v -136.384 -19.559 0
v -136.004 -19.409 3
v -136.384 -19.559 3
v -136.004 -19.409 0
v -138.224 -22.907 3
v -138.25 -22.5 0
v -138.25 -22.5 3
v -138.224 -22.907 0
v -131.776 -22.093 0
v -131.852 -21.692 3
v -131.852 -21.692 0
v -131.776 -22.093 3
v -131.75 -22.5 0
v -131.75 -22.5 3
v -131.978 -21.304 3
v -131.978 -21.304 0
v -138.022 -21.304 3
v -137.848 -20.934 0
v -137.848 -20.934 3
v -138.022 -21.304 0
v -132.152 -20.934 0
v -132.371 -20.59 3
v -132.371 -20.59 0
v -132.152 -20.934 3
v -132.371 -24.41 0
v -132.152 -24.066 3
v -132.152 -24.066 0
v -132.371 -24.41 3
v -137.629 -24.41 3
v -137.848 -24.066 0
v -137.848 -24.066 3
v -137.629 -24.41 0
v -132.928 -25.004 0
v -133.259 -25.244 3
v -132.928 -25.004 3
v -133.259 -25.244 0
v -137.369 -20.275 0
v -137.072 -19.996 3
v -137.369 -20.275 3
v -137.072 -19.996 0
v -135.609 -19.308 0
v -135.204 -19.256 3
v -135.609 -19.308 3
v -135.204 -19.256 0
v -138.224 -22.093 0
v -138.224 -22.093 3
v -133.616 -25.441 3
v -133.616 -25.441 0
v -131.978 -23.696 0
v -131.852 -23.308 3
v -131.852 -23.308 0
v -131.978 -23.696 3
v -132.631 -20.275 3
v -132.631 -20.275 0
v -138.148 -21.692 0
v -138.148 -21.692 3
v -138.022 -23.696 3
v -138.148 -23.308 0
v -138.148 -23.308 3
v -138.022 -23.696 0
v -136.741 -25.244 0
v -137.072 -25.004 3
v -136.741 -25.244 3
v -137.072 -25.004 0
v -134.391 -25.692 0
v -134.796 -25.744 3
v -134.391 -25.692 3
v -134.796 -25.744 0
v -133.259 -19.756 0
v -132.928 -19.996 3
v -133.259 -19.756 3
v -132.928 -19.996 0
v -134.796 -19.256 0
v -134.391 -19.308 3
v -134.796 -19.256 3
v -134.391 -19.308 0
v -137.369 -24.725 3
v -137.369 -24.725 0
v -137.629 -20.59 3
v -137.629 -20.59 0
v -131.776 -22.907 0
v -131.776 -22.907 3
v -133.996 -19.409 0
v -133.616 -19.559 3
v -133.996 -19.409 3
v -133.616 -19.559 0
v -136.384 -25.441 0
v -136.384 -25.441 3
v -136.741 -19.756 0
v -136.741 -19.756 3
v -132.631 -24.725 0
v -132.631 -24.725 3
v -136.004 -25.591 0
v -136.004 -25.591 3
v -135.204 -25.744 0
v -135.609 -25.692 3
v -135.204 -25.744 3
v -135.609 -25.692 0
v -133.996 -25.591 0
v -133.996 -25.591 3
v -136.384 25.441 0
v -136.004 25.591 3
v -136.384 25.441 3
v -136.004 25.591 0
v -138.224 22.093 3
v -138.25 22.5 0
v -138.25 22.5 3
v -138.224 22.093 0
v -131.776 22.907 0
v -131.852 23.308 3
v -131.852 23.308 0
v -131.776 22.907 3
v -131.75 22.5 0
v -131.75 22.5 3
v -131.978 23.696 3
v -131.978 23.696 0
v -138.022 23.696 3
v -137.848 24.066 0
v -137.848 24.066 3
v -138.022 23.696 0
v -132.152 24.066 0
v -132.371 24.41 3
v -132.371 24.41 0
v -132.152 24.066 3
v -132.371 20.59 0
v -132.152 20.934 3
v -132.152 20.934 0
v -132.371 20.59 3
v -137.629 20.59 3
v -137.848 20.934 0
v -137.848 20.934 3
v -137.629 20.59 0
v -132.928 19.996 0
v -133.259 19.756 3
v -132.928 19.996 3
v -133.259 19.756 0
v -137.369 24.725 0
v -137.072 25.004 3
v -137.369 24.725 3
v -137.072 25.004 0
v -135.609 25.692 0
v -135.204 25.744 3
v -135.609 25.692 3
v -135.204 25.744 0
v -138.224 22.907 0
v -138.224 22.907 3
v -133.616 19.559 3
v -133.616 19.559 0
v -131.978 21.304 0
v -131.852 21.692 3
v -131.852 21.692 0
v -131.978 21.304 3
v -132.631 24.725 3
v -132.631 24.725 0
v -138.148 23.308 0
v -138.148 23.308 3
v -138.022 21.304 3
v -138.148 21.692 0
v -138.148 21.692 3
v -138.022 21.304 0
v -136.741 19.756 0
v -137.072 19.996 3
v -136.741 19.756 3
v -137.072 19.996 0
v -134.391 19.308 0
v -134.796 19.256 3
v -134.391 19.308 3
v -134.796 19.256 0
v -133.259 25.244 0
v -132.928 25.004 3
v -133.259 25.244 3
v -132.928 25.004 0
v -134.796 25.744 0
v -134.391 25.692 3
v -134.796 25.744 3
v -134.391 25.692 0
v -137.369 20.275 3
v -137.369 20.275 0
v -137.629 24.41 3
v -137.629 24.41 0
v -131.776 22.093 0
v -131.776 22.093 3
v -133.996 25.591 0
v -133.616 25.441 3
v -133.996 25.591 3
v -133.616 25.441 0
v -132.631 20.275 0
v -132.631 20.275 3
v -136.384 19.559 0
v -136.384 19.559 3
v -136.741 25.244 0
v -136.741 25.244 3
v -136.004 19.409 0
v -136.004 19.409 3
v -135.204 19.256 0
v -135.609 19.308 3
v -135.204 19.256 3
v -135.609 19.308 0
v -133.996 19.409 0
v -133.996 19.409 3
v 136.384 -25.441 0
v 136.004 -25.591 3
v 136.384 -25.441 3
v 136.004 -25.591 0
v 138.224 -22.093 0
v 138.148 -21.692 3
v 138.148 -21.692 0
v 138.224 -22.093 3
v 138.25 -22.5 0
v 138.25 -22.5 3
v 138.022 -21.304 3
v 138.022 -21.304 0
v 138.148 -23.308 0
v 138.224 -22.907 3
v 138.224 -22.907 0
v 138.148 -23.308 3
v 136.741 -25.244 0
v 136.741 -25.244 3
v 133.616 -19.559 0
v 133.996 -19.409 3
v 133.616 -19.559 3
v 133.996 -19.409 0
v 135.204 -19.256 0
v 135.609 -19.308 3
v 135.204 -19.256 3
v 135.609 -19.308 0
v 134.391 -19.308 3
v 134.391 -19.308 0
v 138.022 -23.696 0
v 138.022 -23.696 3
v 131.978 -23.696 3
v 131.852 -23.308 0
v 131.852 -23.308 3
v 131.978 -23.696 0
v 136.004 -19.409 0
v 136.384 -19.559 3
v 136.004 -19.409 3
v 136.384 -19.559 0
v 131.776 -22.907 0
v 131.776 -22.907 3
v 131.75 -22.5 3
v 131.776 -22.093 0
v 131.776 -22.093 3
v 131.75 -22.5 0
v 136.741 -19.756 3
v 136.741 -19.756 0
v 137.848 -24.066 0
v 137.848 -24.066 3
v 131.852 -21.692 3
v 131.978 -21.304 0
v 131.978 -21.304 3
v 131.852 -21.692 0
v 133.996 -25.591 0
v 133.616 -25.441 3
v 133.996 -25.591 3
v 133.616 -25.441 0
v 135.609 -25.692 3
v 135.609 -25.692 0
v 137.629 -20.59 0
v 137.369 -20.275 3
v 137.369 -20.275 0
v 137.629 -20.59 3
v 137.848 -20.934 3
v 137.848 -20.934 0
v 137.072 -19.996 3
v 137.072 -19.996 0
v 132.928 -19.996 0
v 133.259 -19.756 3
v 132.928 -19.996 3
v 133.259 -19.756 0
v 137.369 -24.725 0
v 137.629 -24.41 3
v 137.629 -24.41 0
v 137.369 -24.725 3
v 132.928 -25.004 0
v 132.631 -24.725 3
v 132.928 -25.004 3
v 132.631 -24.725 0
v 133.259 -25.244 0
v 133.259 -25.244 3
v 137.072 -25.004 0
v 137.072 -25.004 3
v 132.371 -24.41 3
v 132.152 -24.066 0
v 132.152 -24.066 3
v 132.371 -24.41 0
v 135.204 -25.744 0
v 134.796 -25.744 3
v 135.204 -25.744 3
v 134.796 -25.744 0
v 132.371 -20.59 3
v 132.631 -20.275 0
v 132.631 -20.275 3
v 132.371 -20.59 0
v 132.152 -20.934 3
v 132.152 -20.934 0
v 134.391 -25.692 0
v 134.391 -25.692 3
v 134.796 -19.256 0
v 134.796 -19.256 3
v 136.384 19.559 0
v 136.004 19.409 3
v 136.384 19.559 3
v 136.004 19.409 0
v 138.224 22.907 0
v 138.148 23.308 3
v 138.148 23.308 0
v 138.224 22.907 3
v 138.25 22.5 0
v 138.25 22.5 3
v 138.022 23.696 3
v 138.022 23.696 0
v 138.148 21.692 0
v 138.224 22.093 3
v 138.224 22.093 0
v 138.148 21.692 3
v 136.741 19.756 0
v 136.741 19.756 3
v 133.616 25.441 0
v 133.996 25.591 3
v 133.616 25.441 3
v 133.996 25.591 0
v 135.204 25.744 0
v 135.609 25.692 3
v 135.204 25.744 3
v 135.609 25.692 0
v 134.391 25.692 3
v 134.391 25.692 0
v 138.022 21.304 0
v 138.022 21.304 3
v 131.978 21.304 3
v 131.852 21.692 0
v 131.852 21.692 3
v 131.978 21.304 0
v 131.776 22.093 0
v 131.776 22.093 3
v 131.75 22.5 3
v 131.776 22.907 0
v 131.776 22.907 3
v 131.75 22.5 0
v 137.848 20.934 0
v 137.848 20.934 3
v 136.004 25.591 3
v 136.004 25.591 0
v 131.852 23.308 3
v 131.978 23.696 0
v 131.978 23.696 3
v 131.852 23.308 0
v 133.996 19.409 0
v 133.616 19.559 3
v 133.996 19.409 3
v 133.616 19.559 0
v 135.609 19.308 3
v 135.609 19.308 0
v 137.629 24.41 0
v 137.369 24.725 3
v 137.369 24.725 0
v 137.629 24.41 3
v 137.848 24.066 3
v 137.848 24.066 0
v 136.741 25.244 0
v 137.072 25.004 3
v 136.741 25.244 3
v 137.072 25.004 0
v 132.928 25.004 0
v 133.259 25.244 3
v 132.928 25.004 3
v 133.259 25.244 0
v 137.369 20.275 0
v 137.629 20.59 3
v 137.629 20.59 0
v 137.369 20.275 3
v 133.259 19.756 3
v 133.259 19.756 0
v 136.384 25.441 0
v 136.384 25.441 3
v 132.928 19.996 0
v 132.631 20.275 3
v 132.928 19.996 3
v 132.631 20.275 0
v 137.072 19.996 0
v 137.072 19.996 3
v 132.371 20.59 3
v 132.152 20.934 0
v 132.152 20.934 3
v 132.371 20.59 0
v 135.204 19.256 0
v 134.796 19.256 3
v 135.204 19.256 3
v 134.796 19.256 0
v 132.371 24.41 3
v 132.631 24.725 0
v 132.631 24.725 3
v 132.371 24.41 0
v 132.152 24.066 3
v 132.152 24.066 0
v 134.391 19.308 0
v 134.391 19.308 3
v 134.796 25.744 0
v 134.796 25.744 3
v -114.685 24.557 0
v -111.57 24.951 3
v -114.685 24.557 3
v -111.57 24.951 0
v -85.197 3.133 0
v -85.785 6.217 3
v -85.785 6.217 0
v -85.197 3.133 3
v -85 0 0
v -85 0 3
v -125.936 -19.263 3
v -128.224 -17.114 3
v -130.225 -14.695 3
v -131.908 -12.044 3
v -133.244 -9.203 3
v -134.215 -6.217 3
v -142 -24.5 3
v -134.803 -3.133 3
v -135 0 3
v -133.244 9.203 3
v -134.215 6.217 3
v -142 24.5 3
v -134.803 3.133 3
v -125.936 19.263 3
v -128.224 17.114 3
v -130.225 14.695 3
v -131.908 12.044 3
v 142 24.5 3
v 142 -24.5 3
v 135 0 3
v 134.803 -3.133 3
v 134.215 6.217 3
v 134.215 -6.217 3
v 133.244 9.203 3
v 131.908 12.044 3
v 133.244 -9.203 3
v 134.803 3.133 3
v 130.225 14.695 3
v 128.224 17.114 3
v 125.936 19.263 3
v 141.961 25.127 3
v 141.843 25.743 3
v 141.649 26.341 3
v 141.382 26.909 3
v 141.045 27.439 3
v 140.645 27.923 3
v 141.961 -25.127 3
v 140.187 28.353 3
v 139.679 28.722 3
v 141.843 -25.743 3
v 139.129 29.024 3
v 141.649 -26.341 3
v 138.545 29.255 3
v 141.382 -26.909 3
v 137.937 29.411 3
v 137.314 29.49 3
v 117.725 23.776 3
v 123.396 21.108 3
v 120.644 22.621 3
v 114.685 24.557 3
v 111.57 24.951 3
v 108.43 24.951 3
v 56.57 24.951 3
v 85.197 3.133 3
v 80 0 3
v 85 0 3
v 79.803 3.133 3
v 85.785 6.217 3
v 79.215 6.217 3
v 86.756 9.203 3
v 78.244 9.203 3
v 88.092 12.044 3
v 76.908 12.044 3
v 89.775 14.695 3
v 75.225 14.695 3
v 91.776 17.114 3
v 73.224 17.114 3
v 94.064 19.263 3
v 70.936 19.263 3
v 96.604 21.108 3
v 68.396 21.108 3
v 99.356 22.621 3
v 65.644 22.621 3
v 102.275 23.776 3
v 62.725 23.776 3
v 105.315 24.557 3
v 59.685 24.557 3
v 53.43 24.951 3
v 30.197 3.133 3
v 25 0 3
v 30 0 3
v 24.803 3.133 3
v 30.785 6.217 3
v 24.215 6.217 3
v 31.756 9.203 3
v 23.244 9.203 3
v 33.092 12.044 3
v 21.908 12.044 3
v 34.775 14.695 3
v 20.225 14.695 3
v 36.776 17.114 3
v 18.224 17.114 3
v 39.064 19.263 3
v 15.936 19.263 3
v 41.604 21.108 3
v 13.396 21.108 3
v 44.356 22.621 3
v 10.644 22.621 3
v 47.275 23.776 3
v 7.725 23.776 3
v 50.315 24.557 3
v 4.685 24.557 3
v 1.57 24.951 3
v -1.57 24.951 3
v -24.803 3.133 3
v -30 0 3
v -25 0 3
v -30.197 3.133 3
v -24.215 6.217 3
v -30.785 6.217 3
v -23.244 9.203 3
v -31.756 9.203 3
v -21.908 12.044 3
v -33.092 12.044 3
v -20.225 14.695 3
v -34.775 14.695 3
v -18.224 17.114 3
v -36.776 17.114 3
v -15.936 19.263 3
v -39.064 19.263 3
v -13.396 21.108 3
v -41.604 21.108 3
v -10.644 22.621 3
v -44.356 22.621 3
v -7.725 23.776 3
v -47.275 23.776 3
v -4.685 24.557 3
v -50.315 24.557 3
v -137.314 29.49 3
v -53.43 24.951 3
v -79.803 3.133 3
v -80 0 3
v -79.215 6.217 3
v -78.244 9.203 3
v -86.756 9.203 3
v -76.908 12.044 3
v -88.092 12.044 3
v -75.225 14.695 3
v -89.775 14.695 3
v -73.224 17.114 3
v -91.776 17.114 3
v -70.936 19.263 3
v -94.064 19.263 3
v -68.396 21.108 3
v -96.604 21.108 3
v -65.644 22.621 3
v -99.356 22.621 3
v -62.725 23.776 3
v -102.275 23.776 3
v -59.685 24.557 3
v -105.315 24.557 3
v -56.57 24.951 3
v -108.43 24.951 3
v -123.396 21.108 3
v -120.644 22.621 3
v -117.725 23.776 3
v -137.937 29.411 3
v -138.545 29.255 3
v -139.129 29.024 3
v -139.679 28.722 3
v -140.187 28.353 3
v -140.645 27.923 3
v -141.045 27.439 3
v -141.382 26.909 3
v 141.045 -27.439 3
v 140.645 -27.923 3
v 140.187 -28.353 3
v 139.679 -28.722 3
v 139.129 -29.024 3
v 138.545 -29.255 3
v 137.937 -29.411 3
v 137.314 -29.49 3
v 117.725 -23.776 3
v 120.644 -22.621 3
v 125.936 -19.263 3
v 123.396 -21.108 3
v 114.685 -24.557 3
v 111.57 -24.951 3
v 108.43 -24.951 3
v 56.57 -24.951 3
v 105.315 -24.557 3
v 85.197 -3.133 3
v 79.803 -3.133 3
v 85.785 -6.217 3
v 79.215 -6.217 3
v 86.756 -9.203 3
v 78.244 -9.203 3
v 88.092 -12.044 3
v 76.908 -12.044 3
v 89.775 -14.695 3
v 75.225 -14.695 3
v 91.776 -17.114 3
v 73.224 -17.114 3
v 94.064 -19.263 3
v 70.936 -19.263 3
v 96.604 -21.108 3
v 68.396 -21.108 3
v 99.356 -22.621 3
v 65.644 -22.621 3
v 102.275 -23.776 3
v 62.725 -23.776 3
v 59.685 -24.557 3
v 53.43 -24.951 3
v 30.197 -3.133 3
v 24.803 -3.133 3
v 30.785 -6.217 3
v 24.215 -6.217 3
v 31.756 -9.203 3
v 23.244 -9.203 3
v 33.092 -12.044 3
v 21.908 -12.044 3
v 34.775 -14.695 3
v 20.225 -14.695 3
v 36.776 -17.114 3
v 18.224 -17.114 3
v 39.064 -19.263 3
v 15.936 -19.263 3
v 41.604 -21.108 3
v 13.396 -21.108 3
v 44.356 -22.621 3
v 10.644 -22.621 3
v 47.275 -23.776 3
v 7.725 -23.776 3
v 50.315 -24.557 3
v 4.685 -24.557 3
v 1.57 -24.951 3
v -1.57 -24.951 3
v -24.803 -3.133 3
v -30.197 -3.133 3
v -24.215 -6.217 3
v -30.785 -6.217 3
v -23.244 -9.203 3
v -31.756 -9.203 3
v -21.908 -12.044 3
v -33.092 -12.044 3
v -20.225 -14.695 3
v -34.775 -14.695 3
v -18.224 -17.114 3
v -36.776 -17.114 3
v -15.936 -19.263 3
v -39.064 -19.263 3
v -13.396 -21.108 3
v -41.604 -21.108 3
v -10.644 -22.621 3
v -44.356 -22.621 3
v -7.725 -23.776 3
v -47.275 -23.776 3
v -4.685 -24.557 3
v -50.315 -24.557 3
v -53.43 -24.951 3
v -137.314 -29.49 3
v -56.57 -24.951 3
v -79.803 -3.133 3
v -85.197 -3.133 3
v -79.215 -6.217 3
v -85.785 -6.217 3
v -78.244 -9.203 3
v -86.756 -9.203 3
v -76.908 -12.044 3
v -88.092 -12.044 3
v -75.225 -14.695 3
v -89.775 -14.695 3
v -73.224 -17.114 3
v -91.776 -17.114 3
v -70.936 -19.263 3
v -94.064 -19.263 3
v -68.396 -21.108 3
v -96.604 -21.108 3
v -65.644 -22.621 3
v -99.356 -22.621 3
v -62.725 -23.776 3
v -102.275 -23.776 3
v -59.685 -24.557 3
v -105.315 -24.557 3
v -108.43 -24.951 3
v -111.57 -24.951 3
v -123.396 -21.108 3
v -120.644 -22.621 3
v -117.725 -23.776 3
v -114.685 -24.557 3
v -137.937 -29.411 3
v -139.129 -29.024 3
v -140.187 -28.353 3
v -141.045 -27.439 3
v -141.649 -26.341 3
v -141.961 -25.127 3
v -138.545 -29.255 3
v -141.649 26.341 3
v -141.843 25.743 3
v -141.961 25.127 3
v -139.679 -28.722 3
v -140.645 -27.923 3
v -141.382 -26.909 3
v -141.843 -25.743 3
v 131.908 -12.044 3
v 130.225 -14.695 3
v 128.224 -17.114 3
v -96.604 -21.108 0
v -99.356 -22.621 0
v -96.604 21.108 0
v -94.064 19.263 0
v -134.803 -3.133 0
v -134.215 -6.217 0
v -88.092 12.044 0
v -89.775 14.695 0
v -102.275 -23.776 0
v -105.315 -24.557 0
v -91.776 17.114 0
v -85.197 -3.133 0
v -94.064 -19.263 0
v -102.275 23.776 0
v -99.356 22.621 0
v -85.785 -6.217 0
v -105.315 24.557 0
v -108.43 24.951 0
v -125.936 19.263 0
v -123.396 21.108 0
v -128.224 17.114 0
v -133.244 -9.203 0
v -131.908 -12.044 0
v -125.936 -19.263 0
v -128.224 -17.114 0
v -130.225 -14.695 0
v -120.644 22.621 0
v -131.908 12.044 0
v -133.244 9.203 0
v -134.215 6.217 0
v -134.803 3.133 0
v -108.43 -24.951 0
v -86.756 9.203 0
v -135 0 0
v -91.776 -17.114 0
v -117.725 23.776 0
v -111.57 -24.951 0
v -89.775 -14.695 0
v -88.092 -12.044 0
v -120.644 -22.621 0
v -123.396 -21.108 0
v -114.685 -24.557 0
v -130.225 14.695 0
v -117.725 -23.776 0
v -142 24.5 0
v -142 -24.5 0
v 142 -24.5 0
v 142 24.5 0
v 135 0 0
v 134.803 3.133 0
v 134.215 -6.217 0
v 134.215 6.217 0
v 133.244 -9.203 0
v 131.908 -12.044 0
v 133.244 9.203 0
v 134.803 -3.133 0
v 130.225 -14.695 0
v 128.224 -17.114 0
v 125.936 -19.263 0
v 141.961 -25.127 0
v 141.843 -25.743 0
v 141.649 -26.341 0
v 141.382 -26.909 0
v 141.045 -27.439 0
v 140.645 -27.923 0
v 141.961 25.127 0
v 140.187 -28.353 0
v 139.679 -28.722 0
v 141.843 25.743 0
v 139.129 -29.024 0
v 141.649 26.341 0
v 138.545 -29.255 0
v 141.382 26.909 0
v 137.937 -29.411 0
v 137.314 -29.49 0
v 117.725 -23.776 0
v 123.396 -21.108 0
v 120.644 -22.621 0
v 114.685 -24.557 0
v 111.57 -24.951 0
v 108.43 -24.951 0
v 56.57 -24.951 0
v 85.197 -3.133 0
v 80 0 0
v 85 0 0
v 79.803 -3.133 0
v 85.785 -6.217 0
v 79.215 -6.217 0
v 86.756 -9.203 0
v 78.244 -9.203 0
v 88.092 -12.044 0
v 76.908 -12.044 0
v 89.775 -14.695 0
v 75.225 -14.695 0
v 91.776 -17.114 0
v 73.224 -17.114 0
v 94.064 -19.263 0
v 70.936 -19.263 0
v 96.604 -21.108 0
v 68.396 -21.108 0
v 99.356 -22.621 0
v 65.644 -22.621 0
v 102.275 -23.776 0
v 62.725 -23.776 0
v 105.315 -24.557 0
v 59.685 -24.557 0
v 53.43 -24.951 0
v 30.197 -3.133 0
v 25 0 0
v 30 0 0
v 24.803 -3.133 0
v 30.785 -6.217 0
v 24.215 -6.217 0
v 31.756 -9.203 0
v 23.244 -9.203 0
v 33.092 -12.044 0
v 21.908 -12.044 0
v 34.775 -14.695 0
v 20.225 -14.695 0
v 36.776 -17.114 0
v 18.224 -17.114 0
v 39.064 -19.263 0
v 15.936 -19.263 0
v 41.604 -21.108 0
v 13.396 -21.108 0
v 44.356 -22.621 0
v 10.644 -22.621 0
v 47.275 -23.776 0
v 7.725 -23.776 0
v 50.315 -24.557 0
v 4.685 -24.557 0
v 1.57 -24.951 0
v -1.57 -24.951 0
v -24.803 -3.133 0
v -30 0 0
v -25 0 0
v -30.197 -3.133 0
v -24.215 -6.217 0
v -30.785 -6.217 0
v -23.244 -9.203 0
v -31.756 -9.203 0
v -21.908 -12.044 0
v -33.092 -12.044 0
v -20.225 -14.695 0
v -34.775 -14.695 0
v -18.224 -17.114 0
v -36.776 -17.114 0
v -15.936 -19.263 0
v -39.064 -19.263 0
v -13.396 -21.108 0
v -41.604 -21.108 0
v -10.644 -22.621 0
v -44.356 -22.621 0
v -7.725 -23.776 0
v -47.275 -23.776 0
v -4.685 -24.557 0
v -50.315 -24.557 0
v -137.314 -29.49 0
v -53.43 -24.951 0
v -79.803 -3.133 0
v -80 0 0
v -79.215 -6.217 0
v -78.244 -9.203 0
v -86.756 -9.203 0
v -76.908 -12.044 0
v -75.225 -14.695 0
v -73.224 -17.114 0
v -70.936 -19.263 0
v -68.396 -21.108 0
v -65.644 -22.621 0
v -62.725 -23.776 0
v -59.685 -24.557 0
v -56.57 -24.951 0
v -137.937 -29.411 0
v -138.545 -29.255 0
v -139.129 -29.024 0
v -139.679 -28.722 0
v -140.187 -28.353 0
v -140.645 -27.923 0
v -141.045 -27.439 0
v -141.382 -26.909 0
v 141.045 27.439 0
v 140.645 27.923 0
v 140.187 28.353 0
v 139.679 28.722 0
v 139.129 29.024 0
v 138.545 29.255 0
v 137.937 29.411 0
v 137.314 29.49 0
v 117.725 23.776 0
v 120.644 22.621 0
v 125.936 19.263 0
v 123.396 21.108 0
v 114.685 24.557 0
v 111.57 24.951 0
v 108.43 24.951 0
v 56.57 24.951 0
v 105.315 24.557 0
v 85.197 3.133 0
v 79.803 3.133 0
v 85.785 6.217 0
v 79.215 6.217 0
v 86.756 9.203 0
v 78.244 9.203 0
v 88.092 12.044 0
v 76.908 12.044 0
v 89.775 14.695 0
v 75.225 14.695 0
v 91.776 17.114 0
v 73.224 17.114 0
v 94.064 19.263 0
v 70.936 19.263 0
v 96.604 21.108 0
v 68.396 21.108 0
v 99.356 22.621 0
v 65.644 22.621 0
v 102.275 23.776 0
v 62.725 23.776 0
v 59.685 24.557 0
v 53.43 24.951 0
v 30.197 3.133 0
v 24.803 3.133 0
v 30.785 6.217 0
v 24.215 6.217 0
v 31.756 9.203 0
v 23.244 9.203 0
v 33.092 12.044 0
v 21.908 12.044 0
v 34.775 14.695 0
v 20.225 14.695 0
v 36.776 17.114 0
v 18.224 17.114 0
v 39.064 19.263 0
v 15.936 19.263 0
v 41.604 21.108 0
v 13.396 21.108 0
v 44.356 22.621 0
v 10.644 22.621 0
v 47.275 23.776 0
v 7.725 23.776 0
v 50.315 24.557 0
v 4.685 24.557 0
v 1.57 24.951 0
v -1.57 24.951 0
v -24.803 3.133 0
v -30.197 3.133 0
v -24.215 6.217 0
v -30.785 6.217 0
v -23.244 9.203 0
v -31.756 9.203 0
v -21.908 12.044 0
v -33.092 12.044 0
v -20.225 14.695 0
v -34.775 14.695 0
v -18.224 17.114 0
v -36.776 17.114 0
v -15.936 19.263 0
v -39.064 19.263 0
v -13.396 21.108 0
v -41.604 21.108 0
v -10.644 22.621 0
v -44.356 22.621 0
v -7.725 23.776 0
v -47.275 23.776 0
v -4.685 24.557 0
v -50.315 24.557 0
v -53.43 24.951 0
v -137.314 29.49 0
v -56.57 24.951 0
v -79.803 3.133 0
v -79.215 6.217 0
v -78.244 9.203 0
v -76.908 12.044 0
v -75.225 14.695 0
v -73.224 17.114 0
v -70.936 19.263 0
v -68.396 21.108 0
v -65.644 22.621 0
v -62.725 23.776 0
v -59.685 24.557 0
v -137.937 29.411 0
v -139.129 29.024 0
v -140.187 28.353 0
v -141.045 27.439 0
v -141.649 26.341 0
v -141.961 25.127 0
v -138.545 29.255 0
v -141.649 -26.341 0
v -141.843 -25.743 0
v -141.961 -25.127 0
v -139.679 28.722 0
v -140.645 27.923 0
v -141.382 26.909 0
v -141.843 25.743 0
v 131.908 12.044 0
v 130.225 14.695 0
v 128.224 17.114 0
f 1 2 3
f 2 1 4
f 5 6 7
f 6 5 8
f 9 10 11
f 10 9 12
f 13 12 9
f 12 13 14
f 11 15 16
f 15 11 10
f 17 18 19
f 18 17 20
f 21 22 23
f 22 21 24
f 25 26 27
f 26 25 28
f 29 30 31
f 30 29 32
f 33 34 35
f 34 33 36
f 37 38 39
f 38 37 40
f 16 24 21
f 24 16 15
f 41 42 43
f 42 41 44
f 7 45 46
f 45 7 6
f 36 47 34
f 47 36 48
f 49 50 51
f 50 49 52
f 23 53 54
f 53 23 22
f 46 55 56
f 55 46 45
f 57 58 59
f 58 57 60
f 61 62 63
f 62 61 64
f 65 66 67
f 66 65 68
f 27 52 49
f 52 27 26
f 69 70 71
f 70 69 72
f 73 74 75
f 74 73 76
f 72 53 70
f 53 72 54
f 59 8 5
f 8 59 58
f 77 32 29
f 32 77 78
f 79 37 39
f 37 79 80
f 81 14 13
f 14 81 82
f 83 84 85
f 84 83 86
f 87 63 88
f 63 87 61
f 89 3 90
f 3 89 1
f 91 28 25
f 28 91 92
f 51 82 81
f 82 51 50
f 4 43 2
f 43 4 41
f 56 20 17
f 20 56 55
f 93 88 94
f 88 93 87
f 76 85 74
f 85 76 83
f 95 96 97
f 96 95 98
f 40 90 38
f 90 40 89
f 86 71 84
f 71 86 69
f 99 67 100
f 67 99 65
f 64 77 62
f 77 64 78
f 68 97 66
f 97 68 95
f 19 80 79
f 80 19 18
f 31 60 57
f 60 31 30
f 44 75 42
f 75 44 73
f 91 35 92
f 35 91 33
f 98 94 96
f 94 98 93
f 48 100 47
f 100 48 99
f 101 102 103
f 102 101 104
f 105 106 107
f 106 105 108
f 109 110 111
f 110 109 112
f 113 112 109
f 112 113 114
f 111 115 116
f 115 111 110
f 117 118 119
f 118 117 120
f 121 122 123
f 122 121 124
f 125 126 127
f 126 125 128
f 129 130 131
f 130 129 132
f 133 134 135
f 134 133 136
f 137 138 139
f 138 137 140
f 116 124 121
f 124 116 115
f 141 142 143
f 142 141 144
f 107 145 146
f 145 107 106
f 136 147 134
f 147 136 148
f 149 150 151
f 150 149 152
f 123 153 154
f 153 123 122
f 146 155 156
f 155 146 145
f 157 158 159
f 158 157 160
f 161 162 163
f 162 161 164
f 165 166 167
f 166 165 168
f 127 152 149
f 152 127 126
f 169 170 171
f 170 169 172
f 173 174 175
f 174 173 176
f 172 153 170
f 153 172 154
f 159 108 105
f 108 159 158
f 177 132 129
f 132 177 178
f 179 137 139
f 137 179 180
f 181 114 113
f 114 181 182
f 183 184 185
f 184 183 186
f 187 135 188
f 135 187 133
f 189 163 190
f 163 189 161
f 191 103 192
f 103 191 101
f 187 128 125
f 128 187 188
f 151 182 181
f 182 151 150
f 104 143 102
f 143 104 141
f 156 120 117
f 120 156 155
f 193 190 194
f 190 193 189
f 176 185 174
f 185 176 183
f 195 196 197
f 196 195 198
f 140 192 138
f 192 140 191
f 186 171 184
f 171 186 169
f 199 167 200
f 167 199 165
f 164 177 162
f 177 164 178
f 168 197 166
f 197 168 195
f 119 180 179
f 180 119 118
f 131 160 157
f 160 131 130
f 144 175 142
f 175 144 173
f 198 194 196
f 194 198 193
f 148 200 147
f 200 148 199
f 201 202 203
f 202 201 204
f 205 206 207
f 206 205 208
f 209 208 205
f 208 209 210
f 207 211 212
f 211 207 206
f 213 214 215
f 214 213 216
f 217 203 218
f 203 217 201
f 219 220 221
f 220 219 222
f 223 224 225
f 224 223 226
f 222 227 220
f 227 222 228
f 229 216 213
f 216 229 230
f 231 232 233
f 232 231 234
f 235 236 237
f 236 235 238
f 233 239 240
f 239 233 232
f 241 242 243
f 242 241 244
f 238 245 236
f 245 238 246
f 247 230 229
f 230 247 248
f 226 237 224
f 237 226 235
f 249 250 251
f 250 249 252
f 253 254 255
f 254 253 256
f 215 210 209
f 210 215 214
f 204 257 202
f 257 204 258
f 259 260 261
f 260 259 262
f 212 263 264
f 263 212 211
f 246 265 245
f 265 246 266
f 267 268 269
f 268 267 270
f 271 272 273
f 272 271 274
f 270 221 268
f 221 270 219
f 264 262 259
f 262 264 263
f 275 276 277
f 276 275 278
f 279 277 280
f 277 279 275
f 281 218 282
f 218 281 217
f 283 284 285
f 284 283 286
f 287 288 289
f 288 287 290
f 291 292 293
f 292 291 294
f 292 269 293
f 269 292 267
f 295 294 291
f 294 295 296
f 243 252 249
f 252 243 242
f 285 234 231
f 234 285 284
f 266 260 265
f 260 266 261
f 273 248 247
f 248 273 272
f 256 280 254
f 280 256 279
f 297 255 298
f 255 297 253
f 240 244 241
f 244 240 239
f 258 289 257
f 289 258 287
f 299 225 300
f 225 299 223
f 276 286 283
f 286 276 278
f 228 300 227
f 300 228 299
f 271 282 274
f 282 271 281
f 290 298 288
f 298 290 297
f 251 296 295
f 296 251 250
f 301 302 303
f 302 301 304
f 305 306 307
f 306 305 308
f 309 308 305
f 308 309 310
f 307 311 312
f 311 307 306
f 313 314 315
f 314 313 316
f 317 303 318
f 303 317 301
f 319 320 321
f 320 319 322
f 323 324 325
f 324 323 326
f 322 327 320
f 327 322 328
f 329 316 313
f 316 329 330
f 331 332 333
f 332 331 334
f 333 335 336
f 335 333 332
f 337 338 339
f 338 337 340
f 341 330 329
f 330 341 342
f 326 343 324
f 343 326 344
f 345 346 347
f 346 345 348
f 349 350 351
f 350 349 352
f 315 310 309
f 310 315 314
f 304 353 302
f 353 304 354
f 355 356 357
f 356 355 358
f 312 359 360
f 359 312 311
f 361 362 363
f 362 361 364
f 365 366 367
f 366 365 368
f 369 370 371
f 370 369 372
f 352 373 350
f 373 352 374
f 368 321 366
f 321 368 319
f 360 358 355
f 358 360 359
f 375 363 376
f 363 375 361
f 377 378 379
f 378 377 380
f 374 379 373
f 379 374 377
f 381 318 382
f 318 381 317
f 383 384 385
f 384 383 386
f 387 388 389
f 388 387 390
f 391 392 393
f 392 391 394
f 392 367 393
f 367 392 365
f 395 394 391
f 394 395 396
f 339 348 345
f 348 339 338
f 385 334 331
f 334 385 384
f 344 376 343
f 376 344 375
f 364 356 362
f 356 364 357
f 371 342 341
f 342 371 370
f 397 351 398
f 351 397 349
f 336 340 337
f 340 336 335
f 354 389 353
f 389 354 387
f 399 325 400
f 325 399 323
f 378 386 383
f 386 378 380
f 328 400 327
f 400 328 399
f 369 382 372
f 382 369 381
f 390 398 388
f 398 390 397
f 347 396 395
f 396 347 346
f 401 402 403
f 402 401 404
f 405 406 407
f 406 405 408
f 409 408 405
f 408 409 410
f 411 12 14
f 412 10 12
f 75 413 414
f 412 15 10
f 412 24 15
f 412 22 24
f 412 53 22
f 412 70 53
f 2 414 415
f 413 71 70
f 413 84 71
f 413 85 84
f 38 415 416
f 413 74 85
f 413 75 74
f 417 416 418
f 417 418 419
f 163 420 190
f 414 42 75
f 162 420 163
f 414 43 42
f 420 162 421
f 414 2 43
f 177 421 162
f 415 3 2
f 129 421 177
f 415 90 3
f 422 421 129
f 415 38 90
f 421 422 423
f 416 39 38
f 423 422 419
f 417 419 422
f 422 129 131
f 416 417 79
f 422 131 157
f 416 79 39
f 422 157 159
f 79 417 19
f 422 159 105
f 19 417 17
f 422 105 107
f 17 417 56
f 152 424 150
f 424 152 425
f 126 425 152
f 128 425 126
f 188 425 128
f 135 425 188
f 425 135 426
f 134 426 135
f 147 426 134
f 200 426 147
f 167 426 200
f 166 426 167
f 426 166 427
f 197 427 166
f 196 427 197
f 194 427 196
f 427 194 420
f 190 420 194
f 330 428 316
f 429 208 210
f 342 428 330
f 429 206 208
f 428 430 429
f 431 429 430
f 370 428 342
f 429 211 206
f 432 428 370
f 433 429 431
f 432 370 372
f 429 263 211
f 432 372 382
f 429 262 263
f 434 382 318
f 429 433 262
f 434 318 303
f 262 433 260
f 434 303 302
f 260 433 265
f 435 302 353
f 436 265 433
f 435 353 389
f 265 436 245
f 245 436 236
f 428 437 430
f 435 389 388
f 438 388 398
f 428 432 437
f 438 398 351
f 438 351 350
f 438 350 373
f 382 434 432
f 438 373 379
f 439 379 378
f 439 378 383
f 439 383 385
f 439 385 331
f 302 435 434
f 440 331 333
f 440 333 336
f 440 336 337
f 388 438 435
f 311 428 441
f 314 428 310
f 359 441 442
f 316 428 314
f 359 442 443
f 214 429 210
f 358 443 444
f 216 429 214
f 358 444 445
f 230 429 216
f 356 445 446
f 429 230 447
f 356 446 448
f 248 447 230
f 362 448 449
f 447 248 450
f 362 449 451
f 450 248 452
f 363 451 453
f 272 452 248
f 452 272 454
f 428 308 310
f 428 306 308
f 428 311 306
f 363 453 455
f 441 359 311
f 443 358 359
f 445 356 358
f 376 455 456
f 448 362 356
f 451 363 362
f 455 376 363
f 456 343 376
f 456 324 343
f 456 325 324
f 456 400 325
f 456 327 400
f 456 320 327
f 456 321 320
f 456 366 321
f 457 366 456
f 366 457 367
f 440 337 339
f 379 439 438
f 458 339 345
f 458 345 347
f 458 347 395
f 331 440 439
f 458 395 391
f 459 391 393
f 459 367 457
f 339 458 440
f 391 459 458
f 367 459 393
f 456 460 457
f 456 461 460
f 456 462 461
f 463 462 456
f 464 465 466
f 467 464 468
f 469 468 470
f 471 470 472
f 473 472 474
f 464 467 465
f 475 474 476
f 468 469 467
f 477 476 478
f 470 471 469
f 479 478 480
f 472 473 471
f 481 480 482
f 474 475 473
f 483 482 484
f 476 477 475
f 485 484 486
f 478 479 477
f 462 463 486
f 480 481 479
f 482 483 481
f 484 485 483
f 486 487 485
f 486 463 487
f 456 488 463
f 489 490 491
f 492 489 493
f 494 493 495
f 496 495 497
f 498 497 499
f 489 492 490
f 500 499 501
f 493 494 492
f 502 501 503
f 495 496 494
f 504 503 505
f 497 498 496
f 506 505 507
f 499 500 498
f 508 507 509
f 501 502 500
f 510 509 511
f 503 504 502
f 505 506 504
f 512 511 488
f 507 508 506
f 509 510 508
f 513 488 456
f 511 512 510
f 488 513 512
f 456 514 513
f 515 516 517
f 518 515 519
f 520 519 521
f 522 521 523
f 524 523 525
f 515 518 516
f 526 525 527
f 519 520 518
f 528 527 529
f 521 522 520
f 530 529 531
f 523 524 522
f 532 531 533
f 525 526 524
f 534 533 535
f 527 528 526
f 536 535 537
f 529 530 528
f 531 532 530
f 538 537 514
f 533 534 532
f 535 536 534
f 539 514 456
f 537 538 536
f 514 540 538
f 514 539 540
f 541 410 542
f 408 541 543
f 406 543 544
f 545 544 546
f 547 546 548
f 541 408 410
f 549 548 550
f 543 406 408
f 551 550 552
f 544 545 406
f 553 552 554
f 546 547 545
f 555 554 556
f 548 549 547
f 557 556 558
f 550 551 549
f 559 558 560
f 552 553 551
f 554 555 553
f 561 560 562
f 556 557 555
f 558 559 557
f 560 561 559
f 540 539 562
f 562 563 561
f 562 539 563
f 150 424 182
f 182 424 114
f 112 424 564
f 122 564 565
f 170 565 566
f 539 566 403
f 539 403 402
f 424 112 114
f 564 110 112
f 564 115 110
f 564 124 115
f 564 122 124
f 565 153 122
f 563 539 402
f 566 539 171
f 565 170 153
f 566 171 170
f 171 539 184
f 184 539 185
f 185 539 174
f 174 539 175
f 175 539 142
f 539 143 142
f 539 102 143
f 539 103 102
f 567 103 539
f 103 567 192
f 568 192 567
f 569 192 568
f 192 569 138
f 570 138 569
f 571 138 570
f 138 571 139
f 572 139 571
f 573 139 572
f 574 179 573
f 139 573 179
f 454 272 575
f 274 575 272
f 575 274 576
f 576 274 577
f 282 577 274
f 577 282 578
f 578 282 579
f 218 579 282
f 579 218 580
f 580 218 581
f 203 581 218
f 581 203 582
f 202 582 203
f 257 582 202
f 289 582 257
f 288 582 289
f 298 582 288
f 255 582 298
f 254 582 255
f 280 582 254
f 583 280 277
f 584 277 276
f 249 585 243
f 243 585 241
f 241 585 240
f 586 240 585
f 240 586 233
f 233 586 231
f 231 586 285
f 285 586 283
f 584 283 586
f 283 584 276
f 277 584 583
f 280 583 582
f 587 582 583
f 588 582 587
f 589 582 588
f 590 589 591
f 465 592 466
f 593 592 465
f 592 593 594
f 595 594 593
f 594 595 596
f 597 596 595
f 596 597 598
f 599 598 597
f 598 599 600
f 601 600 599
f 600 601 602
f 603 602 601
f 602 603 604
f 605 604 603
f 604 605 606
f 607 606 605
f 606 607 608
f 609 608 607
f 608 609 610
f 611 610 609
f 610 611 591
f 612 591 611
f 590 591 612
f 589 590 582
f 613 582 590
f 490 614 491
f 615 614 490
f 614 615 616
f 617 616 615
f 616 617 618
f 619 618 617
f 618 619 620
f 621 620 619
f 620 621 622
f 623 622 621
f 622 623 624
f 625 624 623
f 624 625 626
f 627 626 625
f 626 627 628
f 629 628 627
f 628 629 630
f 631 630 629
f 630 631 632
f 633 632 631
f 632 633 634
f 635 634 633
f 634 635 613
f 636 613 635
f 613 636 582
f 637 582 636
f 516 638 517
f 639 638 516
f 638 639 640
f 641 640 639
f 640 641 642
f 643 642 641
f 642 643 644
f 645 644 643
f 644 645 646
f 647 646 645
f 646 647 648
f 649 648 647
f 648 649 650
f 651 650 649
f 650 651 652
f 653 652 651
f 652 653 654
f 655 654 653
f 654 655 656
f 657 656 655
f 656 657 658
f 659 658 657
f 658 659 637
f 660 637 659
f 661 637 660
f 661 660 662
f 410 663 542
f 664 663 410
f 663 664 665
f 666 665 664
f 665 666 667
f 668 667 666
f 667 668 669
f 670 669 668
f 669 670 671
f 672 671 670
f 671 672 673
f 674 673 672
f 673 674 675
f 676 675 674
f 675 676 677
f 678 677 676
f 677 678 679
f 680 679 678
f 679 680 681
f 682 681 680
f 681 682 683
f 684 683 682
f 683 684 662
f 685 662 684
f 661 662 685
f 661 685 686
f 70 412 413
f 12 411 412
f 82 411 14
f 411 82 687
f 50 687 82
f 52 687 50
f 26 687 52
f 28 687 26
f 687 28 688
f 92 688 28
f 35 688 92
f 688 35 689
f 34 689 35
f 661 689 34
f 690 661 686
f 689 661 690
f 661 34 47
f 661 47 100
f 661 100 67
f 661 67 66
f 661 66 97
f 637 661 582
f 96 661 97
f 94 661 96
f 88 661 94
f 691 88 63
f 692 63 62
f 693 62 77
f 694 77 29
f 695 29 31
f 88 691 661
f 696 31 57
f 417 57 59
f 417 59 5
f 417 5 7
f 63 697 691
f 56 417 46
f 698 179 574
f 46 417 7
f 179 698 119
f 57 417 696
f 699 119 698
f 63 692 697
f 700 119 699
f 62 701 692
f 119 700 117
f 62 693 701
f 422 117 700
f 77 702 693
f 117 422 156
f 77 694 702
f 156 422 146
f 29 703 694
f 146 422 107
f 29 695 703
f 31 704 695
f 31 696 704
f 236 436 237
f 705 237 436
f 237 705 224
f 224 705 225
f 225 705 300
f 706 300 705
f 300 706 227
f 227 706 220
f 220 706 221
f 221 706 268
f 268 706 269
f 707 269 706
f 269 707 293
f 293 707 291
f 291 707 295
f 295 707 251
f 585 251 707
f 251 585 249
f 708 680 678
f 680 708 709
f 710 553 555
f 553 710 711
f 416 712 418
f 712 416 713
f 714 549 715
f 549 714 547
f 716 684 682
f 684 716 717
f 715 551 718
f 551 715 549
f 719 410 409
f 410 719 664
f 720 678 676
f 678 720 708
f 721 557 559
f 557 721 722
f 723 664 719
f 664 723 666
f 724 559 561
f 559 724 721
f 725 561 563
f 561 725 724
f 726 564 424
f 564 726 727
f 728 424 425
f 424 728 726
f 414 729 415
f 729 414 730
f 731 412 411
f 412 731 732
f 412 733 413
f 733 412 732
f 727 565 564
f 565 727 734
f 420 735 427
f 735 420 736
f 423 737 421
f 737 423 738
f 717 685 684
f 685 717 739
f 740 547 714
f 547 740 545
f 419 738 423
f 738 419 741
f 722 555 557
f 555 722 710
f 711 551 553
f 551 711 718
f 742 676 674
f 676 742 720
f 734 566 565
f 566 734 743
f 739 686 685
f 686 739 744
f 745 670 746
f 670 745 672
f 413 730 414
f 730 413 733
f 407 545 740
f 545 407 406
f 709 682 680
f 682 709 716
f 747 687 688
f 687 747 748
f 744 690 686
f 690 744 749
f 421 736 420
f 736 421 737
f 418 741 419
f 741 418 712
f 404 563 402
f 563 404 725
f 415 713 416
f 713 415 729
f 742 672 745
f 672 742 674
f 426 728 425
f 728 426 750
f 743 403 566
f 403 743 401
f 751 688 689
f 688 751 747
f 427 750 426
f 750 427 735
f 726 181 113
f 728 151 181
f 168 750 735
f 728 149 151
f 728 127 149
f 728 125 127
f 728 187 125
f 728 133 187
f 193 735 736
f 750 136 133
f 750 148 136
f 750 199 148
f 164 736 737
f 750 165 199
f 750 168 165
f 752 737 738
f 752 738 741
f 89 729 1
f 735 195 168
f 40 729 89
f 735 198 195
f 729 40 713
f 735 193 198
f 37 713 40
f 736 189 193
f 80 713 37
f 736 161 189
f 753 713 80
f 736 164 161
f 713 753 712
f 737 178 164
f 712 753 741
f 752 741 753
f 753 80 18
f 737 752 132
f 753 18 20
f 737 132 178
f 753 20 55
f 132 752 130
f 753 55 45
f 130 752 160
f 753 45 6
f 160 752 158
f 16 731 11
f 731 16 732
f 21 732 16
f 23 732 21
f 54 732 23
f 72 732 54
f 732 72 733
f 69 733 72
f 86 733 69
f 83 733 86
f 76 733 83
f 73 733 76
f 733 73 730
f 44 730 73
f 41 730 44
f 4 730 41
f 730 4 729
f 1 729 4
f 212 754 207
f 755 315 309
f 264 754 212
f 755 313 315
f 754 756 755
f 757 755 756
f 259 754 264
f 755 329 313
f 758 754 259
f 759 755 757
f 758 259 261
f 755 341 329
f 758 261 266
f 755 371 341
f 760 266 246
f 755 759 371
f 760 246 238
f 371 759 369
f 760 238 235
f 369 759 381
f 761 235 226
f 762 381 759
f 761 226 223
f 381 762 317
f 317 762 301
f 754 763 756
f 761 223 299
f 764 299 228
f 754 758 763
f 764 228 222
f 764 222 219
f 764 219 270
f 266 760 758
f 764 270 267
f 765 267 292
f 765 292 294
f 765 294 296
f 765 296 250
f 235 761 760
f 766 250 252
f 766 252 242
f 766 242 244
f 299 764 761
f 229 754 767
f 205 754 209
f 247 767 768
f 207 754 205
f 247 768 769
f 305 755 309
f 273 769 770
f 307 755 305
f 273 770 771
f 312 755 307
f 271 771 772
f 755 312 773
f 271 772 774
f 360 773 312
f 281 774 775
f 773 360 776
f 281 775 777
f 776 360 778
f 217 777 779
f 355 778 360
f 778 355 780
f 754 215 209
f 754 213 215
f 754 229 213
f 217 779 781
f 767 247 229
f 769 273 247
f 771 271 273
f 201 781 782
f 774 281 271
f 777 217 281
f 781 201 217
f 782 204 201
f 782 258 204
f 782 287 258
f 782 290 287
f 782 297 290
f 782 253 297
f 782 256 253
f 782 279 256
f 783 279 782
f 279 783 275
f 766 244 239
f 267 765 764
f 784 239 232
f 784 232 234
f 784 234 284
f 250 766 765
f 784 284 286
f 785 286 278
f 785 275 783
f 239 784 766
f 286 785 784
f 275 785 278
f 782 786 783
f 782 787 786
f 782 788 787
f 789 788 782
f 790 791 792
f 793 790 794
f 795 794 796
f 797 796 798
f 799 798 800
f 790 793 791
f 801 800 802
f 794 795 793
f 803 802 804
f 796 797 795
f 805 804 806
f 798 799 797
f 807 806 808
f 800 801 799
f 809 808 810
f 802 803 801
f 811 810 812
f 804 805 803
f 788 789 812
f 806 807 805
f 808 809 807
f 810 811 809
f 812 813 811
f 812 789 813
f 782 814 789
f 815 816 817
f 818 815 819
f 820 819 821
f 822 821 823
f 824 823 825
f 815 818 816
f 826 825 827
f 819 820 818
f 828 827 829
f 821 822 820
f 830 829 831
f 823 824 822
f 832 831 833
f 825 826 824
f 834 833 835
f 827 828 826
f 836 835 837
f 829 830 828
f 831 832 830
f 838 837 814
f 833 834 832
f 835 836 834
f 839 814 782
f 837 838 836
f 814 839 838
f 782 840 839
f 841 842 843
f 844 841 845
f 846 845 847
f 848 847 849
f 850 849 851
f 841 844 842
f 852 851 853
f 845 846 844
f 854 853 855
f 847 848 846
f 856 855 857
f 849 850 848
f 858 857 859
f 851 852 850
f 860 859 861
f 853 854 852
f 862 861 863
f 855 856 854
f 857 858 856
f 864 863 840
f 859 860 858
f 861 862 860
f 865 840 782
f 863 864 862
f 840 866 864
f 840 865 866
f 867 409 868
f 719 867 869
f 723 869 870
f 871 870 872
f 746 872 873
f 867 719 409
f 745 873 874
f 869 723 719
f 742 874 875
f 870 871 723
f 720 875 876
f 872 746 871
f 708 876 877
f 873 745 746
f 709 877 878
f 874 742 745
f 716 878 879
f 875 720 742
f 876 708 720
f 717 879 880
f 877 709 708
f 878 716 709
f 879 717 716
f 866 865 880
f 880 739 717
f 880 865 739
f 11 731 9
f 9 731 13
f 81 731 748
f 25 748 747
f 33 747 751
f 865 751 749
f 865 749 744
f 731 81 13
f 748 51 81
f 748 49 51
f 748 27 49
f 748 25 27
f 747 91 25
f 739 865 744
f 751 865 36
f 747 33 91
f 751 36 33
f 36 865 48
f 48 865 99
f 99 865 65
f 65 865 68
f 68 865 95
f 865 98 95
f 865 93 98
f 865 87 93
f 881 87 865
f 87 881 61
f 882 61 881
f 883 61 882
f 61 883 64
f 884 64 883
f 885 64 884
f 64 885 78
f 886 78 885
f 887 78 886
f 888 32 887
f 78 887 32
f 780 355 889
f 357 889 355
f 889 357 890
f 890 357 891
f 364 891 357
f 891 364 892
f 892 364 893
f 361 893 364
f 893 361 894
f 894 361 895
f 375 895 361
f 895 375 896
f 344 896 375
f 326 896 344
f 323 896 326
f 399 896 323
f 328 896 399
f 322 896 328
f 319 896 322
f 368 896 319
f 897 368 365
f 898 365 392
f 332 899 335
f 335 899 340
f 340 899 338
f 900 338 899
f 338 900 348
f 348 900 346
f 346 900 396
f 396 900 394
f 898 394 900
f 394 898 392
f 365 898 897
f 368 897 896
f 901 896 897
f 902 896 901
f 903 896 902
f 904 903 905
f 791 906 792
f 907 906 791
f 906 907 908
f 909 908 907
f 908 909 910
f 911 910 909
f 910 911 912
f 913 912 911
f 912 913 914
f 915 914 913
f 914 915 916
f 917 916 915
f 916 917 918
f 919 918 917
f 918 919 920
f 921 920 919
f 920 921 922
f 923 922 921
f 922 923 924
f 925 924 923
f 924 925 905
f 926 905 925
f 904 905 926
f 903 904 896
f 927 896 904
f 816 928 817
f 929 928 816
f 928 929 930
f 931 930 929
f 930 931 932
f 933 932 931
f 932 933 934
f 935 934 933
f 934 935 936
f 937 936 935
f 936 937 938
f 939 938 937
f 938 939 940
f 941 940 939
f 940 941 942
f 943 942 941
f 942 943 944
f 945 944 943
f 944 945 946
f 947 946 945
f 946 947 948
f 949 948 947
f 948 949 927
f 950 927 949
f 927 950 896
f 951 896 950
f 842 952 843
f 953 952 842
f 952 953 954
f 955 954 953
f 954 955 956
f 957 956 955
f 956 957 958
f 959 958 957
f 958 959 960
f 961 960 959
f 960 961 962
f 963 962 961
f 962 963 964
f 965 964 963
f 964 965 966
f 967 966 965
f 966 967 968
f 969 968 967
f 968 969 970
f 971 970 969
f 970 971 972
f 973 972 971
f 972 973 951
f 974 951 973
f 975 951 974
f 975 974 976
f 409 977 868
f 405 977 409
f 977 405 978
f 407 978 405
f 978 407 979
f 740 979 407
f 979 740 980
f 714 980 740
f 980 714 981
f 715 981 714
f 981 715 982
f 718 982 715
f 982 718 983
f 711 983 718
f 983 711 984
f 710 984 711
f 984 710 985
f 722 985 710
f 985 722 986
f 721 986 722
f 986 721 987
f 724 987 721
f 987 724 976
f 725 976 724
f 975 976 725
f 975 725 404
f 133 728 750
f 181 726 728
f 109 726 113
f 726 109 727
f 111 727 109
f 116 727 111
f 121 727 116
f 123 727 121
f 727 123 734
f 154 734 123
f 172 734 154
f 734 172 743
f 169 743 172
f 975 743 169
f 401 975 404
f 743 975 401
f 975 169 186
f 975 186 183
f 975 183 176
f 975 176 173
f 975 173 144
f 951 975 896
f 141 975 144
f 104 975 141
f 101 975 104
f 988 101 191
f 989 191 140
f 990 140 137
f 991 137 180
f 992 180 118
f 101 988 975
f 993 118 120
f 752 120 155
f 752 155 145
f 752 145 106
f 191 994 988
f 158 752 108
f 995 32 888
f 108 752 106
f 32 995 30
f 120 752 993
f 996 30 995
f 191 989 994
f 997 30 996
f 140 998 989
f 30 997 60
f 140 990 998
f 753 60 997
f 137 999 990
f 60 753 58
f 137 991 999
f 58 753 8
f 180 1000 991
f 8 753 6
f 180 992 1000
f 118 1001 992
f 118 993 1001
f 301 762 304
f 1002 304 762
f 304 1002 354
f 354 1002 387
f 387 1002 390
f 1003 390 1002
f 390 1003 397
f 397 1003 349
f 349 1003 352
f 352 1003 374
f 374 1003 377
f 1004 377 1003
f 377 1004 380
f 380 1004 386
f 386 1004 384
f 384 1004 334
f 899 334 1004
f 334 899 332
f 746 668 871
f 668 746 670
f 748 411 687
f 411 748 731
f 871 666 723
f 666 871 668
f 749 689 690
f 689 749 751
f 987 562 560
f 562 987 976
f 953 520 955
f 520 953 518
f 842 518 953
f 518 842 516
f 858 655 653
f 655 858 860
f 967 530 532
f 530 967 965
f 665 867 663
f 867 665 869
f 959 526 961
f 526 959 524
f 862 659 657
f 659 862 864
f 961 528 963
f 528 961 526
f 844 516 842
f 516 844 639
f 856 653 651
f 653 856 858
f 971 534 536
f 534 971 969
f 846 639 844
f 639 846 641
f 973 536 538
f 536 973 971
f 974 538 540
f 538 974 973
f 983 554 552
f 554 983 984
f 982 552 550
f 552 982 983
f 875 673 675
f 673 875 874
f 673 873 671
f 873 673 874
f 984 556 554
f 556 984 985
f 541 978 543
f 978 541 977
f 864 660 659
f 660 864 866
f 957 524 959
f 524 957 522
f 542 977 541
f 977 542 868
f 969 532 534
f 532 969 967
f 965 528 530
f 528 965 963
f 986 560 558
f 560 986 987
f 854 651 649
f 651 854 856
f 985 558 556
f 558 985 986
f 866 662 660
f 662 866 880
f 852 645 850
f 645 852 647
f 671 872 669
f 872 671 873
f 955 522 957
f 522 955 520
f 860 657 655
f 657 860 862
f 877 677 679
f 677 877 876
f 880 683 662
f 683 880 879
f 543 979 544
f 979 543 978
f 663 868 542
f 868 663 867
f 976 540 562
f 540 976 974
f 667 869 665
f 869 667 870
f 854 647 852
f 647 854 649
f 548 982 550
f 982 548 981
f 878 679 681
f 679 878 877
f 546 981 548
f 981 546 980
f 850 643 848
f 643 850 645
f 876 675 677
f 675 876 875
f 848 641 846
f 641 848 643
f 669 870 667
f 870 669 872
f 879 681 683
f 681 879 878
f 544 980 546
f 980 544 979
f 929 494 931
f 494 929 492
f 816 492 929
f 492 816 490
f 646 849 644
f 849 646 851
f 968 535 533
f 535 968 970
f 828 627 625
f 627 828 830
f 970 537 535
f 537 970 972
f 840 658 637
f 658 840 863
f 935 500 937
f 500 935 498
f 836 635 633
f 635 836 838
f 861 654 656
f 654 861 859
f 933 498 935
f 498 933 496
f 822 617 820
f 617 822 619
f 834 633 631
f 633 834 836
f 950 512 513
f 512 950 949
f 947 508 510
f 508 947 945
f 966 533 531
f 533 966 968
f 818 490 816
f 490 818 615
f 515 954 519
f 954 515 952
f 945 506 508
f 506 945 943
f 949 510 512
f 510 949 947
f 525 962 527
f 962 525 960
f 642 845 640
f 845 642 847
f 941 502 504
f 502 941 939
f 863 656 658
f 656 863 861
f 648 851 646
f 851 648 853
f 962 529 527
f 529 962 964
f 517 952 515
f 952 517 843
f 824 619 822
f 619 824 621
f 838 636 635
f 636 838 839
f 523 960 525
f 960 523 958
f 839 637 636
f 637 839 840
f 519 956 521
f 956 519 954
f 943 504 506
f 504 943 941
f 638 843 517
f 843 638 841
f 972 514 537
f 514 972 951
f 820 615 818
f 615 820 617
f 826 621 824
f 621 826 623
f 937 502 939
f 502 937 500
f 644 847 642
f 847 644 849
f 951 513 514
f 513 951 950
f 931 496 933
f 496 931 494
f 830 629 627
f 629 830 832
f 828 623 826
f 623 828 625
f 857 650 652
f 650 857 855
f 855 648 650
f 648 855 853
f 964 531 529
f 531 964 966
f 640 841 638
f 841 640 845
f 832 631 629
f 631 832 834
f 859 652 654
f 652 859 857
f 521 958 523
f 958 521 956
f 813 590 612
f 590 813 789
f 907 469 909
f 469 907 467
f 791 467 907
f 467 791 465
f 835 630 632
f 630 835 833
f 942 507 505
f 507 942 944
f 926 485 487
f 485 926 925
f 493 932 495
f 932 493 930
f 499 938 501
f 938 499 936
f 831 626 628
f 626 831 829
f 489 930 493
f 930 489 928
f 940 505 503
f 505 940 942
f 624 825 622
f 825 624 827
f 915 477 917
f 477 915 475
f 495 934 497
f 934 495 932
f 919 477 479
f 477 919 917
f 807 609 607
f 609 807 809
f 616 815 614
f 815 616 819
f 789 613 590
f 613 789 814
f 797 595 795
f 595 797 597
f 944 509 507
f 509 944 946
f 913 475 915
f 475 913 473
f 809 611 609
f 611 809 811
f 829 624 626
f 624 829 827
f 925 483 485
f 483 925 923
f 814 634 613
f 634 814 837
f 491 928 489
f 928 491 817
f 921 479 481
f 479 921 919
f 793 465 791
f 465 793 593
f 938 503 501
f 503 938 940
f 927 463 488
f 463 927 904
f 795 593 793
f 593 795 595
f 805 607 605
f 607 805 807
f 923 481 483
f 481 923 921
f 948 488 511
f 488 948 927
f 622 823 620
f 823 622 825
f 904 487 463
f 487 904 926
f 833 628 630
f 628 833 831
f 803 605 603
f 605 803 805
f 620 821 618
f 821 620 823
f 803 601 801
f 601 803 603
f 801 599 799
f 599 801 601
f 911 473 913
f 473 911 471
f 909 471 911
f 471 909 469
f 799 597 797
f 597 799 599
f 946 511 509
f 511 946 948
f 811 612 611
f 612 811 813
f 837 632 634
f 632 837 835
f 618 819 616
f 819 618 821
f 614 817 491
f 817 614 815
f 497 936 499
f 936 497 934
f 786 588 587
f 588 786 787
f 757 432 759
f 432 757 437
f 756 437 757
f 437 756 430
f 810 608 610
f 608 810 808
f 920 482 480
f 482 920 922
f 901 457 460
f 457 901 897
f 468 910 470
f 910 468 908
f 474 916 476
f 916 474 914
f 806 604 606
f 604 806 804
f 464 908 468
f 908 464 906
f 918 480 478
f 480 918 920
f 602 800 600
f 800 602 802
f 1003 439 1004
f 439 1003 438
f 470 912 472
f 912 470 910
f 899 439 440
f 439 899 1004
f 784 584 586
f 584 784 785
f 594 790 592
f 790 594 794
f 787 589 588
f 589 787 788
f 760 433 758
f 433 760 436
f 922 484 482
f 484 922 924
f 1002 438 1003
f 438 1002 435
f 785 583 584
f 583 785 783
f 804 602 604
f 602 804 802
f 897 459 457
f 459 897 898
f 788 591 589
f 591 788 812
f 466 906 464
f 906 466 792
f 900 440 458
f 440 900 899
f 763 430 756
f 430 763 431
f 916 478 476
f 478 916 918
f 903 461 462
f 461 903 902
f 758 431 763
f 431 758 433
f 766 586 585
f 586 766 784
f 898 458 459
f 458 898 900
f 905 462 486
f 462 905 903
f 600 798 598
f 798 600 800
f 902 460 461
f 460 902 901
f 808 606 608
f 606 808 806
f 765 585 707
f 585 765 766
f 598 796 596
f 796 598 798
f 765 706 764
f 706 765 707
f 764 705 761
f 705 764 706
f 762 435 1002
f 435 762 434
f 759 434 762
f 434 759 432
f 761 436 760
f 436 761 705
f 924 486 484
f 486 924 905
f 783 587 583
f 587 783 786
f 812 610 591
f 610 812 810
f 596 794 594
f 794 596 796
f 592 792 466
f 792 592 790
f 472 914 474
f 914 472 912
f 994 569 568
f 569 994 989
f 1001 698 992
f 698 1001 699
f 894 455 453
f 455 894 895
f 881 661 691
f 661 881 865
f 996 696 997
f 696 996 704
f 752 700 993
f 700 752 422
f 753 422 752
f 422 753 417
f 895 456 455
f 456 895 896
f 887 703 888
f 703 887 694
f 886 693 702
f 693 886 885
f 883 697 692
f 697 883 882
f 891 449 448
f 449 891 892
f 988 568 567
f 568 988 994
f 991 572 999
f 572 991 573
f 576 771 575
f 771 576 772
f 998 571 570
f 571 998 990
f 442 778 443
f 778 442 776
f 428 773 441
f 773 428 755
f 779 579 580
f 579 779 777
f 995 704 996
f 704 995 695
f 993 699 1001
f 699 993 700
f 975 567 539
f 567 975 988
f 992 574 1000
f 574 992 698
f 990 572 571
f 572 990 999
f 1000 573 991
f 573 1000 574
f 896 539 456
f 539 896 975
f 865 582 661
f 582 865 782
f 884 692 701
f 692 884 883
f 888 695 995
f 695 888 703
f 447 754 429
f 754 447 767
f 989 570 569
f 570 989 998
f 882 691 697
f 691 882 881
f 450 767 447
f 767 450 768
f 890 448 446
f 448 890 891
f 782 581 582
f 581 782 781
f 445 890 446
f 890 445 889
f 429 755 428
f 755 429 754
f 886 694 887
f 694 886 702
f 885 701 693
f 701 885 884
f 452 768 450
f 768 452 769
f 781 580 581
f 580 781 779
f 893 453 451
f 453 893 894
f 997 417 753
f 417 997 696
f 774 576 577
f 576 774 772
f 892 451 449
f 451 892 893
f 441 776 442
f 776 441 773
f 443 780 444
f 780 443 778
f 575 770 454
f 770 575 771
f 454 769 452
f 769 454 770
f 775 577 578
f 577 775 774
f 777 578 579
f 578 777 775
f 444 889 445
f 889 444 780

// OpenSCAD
$fn = 50;


difference() {
	union() {
		hull() {
			translate(v = [-137.0000000000, 24.5000000000, 0]) {
				cylinder(h = 3, r = 5);
			}
			translate(v = [137.0000000000, 24.5000000000, 0]) {
				cylinder(h = 3, r = 5);
			}
			translate(v = [-137.0000000000, -24.5000000000, 0]) {
				cylinder(h = 3, r = 5);
			}
			translate(v = [137.0000000000, -24.5000000000, 0]) {
				cylinder(h = 3, r = 5);
			}
		}
	}
	union() {
		#translate(v = [-135.0000000000, -22.5000000000, -100.0000000000]) {
			cylinder(h = 200, r = 3.2500000000);
		}
		#translate(v = [-135.0000000000, 22.5000000000, -100.0000000000]) {
			cylinder(h = 200, r = 3.2500000000);
		}
		#translate(v = [135.0000000000, -22.5000000000, -100.0000000000]) {
			cylinder(h = 200, r = 3.2500000000);
		}
		#translate(v = [135.0000000000, 22.5000000000, -100.0000000000]) {
			cylinder(h = 200, r = 3.2500000000);
		}
		#translate(v = [-110.0000000000, 0, 0]) {
			cylinder(h = 3, r = 25.0000000000);
		}
		#translate(v = [-55.0000000000, 0, 0]) {
			cylinder(h = 3, r = 25.0000000000);
		}
		#cylinder(h = 3, r = 25.0000000000);
		#translate(v = [55.0000000000, 0, 0]) {
			cylinder(h = 3, r = 25.0000000000);
		}
		#translate(v = [110.0000000000, 0, 0]) {
			cylinder(h = 3, r = 25.0000000000);
		}
	}
}
